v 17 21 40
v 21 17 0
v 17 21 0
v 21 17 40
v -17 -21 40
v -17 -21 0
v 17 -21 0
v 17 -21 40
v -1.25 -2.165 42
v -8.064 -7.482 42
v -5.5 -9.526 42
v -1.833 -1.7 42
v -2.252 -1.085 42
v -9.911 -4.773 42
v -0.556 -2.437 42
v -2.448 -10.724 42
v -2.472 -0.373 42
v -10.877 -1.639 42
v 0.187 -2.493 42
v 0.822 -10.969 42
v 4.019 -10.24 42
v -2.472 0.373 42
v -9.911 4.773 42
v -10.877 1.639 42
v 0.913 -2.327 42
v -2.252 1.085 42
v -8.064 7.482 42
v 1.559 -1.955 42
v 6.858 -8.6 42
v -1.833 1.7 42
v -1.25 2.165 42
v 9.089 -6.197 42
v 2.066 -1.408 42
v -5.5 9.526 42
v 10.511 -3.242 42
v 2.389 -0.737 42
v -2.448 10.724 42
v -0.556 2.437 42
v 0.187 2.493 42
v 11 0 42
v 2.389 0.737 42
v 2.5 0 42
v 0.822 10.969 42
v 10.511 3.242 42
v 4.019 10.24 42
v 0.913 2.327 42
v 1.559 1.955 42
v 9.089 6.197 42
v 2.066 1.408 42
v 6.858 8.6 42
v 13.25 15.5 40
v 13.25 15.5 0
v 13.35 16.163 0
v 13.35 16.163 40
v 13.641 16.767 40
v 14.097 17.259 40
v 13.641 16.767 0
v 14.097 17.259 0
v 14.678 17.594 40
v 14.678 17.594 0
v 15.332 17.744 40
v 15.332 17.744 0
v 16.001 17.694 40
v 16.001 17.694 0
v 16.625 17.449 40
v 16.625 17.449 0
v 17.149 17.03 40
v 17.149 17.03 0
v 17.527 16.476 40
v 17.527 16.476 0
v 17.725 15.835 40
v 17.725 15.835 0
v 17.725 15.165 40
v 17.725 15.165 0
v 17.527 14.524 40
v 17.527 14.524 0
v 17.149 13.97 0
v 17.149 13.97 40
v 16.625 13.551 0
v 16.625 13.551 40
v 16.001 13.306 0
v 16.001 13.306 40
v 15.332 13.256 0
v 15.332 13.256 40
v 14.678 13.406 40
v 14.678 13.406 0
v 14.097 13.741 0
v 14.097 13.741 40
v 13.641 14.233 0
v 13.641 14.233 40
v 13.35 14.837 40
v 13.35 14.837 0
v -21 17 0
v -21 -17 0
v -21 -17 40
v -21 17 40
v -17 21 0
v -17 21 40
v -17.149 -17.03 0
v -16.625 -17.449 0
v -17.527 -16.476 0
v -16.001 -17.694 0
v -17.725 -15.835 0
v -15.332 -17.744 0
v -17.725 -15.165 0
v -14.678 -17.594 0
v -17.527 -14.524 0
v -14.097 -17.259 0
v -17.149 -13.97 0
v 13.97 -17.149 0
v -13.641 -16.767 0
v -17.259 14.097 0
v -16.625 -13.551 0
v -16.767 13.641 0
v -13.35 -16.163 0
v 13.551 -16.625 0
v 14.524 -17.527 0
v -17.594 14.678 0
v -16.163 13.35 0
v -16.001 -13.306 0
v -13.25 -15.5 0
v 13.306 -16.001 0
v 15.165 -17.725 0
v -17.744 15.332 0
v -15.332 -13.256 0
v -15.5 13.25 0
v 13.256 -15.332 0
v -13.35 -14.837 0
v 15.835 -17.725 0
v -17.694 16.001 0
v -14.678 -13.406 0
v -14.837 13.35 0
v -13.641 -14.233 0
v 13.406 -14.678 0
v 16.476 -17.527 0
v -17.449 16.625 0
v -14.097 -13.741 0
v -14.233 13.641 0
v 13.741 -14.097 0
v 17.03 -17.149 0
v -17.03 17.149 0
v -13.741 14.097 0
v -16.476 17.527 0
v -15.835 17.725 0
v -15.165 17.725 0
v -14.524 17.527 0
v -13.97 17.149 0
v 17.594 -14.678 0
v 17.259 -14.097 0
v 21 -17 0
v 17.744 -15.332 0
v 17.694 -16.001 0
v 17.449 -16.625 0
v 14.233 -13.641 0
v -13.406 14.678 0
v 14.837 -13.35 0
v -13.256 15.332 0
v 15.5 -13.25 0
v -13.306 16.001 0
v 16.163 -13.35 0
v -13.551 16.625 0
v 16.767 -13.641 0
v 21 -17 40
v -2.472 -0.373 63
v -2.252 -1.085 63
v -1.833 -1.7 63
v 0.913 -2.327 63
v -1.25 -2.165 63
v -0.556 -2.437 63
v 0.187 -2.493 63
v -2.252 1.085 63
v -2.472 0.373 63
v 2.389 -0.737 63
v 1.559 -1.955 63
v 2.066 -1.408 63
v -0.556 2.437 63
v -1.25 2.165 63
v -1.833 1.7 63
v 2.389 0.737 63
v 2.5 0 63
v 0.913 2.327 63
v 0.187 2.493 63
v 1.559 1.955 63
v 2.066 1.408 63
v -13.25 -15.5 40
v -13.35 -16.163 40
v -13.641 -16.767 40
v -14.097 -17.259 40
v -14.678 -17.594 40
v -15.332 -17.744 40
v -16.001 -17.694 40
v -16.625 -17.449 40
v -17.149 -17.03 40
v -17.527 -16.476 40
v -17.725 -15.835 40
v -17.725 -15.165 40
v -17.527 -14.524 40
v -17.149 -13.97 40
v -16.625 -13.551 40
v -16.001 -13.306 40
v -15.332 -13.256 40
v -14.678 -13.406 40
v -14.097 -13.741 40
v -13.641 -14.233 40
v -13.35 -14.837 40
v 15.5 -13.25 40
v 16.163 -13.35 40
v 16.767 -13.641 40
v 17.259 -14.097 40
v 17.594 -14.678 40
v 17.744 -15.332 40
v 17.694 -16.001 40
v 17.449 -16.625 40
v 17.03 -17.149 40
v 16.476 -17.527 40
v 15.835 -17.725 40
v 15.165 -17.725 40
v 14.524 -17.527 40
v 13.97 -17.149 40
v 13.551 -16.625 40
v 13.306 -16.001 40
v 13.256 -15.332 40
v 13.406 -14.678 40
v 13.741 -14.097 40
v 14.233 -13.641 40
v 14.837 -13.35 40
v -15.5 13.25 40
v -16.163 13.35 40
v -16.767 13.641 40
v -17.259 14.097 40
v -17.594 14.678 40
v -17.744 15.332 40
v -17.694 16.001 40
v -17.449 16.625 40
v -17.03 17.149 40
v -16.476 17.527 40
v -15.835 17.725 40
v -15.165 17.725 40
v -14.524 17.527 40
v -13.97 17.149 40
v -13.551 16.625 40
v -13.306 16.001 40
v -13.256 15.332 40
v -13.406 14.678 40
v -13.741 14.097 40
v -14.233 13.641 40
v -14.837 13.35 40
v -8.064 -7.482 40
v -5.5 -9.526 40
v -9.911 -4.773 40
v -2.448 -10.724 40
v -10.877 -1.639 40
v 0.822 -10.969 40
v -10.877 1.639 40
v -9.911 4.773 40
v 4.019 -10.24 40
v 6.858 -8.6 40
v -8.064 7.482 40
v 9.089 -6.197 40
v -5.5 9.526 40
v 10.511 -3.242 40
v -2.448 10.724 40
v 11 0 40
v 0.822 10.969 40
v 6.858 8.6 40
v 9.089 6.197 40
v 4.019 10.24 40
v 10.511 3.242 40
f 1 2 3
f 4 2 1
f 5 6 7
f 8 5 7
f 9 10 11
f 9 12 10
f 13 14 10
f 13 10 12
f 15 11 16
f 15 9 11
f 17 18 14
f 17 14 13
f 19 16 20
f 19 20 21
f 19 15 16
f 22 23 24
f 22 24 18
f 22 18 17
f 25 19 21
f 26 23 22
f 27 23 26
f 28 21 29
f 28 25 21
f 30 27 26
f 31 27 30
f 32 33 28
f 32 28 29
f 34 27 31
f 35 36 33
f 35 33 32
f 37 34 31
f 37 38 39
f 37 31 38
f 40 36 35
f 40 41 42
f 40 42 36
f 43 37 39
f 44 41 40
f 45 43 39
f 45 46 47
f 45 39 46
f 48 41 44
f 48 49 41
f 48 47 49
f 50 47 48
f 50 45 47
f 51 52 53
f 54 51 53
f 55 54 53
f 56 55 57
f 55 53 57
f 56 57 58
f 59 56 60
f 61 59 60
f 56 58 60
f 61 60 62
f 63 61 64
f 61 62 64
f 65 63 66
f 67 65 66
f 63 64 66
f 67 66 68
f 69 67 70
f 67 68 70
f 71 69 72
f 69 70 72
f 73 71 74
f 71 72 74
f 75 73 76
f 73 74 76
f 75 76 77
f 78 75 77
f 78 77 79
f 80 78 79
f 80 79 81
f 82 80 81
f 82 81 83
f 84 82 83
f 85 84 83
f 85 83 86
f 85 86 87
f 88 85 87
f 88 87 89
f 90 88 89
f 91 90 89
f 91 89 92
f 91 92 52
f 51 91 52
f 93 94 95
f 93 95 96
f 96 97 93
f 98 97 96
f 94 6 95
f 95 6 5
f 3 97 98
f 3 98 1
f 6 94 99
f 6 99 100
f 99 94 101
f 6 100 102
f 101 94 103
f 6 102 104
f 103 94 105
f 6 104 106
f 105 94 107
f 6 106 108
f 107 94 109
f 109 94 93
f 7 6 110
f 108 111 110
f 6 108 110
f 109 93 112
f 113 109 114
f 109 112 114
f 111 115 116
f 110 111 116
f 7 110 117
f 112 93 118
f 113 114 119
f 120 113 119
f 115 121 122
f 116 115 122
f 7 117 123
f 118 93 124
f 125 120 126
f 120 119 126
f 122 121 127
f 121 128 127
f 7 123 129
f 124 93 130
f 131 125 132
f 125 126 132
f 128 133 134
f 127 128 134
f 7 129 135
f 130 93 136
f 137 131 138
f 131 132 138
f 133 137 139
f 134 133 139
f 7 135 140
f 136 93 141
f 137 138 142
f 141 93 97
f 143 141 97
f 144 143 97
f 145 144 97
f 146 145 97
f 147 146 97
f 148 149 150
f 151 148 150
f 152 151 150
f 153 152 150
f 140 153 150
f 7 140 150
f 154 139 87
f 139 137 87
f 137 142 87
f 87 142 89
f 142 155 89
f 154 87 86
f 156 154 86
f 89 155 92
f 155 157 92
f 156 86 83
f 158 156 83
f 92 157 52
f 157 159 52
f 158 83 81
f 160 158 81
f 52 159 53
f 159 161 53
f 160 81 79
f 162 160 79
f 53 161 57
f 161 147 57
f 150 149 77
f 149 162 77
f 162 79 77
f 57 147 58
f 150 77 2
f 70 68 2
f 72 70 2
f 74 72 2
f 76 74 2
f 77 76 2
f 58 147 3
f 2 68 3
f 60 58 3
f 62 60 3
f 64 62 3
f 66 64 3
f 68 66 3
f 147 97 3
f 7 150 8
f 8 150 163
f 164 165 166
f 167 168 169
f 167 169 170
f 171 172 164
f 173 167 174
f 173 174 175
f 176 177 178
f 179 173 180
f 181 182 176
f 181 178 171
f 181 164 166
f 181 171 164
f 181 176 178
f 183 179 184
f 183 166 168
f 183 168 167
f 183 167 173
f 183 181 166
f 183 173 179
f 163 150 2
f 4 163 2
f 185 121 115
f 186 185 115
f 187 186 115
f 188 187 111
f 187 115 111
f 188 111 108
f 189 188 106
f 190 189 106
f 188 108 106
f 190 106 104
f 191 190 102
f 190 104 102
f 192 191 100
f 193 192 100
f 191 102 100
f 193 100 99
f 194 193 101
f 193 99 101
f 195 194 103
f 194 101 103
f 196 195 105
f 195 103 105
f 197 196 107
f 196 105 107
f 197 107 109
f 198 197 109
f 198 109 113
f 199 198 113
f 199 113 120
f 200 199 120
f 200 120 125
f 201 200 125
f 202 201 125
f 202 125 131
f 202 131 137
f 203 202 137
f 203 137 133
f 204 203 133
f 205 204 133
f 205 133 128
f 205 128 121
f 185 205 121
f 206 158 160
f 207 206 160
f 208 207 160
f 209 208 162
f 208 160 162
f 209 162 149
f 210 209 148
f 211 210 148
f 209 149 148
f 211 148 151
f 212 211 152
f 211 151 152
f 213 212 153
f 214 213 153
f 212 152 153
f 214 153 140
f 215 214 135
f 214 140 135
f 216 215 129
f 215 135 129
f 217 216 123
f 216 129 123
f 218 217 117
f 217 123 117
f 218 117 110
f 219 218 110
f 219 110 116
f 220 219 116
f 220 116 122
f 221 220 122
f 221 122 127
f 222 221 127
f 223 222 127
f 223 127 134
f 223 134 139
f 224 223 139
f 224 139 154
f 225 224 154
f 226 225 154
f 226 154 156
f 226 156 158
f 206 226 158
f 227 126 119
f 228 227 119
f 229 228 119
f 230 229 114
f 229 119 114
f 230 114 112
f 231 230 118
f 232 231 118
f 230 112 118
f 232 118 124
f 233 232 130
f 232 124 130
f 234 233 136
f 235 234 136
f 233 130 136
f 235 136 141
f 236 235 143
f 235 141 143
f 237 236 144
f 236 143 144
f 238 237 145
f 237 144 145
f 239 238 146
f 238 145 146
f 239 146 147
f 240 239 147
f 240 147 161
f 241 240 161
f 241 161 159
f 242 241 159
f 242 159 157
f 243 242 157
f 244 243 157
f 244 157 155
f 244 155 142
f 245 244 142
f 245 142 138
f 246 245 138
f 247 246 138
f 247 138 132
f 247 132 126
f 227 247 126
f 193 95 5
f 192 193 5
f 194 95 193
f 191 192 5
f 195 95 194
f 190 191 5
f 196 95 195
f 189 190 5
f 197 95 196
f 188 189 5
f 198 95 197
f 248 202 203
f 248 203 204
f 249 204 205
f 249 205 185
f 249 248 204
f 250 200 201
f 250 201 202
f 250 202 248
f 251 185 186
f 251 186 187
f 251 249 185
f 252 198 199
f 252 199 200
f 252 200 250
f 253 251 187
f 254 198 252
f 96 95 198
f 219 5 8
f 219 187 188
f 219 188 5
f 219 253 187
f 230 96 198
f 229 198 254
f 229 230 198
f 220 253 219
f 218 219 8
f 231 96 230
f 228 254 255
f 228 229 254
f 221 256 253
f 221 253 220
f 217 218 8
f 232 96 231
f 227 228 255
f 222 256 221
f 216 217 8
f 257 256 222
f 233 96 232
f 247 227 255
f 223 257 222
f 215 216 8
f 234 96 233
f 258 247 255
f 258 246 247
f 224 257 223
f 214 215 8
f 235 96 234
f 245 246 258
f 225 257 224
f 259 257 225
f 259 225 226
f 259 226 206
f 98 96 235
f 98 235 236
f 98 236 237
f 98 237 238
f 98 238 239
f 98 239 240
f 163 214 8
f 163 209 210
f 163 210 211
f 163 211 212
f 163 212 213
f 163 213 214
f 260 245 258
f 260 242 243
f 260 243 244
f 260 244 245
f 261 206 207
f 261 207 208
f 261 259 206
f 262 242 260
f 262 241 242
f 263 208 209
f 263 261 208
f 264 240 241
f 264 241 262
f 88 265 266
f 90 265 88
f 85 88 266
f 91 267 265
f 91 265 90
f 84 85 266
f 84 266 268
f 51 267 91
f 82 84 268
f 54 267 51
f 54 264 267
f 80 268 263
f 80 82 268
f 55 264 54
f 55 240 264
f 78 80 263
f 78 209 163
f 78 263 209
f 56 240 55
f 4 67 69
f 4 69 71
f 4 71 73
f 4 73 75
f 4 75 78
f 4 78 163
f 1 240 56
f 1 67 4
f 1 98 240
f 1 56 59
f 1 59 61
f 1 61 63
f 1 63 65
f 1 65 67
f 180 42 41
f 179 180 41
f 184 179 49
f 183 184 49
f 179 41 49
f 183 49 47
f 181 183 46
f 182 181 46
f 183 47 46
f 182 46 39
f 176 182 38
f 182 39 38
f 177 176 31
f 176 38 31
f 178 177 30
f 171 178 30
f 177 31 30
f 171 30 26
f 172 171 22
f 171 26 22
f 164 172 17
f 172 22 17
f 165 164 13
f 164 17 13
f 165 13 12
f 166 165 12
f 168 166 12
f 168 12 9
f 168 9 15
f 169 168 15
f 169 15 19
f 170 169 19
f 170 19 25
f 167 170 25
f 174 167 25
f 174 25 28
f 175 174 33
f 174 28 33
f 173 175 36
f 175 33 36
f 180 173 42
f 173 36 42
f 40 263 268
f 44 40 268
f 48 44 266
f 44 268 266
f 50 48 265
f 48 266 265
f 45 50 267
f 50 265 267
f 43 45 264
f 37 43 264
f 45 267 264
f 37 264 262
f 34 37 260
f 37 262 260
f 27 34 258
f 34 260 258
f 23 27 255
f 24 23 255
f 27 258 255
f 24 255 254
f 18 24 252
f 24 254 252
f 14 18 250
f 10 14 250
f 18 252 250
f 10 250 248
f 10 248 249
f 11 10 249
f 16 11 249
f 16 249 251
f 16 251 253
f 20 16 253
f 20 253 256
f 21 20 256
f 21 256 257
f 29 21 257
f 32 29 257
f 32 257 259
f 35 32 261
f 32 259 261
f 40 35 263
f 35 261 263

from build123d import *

# Parameters (mm, degrees)
F1_W            = 42
F1_H            = 42
F2_DEPTH        = 40
F3_R            = 11
F4_DEPTH        = 2
F5_R            = 2.5
F6_DEPTH        = 21
F8_D            = 4.5
F8_COPIES_COUNT = 4
F9_SIZE         = 4


# Not quite as in the source:
# - a pattern or mirror of a feature is missing from the dataset's text; its kind, count and spacing are read off the source's solid


with BuildPart() as f2:
    # F1 (on Top) → F2 (new body)
    with BuildSketch(Plane.XY):
        Rectangle(F1_W, F1_H)
    extrude(amount=F2_DEPTH)

    # F3 (on face) → F4 (join)
    with BuildSketch(Plane.XY.offset(40)):
        Circle(F3_R)
    extrude(amount=F4_DEPTH)

    # F5 (on face) → F6 (join)
    with BuildSketch(Plane.XY.offset(42)):
        Circle(F5_R)
    extrude(amount=F6_DEPTH)

    # F8 (through all)
    with Locations(Plane.XY.offset(40)):
        with Locations((15.5, 15.5)):
            f8 = Hole(F8_D / 2)

    # F8_copies: F8 ×4 about axis
    f8_copies_axis = Axis((0, 0, 0), (0, 0, 1))
    for i in range(1, F8_COPIES_COUNT):
        add(f8.rotate(f8_copies_axis, i * 360 / F8_COPIES_COUNT), mode=Mode.SUBTRACT)

    # F9
    f9_edges = [f2.edges().sort_by_distance(p)[0] for p in [
        (21, 21, 20),
        (21, -21, 20),
        (-21, -21, 20),
        (-21, 21, 20),
    ]]
    chamfer(f9_edges, length=F9_SIZE)


solid = f2.part
